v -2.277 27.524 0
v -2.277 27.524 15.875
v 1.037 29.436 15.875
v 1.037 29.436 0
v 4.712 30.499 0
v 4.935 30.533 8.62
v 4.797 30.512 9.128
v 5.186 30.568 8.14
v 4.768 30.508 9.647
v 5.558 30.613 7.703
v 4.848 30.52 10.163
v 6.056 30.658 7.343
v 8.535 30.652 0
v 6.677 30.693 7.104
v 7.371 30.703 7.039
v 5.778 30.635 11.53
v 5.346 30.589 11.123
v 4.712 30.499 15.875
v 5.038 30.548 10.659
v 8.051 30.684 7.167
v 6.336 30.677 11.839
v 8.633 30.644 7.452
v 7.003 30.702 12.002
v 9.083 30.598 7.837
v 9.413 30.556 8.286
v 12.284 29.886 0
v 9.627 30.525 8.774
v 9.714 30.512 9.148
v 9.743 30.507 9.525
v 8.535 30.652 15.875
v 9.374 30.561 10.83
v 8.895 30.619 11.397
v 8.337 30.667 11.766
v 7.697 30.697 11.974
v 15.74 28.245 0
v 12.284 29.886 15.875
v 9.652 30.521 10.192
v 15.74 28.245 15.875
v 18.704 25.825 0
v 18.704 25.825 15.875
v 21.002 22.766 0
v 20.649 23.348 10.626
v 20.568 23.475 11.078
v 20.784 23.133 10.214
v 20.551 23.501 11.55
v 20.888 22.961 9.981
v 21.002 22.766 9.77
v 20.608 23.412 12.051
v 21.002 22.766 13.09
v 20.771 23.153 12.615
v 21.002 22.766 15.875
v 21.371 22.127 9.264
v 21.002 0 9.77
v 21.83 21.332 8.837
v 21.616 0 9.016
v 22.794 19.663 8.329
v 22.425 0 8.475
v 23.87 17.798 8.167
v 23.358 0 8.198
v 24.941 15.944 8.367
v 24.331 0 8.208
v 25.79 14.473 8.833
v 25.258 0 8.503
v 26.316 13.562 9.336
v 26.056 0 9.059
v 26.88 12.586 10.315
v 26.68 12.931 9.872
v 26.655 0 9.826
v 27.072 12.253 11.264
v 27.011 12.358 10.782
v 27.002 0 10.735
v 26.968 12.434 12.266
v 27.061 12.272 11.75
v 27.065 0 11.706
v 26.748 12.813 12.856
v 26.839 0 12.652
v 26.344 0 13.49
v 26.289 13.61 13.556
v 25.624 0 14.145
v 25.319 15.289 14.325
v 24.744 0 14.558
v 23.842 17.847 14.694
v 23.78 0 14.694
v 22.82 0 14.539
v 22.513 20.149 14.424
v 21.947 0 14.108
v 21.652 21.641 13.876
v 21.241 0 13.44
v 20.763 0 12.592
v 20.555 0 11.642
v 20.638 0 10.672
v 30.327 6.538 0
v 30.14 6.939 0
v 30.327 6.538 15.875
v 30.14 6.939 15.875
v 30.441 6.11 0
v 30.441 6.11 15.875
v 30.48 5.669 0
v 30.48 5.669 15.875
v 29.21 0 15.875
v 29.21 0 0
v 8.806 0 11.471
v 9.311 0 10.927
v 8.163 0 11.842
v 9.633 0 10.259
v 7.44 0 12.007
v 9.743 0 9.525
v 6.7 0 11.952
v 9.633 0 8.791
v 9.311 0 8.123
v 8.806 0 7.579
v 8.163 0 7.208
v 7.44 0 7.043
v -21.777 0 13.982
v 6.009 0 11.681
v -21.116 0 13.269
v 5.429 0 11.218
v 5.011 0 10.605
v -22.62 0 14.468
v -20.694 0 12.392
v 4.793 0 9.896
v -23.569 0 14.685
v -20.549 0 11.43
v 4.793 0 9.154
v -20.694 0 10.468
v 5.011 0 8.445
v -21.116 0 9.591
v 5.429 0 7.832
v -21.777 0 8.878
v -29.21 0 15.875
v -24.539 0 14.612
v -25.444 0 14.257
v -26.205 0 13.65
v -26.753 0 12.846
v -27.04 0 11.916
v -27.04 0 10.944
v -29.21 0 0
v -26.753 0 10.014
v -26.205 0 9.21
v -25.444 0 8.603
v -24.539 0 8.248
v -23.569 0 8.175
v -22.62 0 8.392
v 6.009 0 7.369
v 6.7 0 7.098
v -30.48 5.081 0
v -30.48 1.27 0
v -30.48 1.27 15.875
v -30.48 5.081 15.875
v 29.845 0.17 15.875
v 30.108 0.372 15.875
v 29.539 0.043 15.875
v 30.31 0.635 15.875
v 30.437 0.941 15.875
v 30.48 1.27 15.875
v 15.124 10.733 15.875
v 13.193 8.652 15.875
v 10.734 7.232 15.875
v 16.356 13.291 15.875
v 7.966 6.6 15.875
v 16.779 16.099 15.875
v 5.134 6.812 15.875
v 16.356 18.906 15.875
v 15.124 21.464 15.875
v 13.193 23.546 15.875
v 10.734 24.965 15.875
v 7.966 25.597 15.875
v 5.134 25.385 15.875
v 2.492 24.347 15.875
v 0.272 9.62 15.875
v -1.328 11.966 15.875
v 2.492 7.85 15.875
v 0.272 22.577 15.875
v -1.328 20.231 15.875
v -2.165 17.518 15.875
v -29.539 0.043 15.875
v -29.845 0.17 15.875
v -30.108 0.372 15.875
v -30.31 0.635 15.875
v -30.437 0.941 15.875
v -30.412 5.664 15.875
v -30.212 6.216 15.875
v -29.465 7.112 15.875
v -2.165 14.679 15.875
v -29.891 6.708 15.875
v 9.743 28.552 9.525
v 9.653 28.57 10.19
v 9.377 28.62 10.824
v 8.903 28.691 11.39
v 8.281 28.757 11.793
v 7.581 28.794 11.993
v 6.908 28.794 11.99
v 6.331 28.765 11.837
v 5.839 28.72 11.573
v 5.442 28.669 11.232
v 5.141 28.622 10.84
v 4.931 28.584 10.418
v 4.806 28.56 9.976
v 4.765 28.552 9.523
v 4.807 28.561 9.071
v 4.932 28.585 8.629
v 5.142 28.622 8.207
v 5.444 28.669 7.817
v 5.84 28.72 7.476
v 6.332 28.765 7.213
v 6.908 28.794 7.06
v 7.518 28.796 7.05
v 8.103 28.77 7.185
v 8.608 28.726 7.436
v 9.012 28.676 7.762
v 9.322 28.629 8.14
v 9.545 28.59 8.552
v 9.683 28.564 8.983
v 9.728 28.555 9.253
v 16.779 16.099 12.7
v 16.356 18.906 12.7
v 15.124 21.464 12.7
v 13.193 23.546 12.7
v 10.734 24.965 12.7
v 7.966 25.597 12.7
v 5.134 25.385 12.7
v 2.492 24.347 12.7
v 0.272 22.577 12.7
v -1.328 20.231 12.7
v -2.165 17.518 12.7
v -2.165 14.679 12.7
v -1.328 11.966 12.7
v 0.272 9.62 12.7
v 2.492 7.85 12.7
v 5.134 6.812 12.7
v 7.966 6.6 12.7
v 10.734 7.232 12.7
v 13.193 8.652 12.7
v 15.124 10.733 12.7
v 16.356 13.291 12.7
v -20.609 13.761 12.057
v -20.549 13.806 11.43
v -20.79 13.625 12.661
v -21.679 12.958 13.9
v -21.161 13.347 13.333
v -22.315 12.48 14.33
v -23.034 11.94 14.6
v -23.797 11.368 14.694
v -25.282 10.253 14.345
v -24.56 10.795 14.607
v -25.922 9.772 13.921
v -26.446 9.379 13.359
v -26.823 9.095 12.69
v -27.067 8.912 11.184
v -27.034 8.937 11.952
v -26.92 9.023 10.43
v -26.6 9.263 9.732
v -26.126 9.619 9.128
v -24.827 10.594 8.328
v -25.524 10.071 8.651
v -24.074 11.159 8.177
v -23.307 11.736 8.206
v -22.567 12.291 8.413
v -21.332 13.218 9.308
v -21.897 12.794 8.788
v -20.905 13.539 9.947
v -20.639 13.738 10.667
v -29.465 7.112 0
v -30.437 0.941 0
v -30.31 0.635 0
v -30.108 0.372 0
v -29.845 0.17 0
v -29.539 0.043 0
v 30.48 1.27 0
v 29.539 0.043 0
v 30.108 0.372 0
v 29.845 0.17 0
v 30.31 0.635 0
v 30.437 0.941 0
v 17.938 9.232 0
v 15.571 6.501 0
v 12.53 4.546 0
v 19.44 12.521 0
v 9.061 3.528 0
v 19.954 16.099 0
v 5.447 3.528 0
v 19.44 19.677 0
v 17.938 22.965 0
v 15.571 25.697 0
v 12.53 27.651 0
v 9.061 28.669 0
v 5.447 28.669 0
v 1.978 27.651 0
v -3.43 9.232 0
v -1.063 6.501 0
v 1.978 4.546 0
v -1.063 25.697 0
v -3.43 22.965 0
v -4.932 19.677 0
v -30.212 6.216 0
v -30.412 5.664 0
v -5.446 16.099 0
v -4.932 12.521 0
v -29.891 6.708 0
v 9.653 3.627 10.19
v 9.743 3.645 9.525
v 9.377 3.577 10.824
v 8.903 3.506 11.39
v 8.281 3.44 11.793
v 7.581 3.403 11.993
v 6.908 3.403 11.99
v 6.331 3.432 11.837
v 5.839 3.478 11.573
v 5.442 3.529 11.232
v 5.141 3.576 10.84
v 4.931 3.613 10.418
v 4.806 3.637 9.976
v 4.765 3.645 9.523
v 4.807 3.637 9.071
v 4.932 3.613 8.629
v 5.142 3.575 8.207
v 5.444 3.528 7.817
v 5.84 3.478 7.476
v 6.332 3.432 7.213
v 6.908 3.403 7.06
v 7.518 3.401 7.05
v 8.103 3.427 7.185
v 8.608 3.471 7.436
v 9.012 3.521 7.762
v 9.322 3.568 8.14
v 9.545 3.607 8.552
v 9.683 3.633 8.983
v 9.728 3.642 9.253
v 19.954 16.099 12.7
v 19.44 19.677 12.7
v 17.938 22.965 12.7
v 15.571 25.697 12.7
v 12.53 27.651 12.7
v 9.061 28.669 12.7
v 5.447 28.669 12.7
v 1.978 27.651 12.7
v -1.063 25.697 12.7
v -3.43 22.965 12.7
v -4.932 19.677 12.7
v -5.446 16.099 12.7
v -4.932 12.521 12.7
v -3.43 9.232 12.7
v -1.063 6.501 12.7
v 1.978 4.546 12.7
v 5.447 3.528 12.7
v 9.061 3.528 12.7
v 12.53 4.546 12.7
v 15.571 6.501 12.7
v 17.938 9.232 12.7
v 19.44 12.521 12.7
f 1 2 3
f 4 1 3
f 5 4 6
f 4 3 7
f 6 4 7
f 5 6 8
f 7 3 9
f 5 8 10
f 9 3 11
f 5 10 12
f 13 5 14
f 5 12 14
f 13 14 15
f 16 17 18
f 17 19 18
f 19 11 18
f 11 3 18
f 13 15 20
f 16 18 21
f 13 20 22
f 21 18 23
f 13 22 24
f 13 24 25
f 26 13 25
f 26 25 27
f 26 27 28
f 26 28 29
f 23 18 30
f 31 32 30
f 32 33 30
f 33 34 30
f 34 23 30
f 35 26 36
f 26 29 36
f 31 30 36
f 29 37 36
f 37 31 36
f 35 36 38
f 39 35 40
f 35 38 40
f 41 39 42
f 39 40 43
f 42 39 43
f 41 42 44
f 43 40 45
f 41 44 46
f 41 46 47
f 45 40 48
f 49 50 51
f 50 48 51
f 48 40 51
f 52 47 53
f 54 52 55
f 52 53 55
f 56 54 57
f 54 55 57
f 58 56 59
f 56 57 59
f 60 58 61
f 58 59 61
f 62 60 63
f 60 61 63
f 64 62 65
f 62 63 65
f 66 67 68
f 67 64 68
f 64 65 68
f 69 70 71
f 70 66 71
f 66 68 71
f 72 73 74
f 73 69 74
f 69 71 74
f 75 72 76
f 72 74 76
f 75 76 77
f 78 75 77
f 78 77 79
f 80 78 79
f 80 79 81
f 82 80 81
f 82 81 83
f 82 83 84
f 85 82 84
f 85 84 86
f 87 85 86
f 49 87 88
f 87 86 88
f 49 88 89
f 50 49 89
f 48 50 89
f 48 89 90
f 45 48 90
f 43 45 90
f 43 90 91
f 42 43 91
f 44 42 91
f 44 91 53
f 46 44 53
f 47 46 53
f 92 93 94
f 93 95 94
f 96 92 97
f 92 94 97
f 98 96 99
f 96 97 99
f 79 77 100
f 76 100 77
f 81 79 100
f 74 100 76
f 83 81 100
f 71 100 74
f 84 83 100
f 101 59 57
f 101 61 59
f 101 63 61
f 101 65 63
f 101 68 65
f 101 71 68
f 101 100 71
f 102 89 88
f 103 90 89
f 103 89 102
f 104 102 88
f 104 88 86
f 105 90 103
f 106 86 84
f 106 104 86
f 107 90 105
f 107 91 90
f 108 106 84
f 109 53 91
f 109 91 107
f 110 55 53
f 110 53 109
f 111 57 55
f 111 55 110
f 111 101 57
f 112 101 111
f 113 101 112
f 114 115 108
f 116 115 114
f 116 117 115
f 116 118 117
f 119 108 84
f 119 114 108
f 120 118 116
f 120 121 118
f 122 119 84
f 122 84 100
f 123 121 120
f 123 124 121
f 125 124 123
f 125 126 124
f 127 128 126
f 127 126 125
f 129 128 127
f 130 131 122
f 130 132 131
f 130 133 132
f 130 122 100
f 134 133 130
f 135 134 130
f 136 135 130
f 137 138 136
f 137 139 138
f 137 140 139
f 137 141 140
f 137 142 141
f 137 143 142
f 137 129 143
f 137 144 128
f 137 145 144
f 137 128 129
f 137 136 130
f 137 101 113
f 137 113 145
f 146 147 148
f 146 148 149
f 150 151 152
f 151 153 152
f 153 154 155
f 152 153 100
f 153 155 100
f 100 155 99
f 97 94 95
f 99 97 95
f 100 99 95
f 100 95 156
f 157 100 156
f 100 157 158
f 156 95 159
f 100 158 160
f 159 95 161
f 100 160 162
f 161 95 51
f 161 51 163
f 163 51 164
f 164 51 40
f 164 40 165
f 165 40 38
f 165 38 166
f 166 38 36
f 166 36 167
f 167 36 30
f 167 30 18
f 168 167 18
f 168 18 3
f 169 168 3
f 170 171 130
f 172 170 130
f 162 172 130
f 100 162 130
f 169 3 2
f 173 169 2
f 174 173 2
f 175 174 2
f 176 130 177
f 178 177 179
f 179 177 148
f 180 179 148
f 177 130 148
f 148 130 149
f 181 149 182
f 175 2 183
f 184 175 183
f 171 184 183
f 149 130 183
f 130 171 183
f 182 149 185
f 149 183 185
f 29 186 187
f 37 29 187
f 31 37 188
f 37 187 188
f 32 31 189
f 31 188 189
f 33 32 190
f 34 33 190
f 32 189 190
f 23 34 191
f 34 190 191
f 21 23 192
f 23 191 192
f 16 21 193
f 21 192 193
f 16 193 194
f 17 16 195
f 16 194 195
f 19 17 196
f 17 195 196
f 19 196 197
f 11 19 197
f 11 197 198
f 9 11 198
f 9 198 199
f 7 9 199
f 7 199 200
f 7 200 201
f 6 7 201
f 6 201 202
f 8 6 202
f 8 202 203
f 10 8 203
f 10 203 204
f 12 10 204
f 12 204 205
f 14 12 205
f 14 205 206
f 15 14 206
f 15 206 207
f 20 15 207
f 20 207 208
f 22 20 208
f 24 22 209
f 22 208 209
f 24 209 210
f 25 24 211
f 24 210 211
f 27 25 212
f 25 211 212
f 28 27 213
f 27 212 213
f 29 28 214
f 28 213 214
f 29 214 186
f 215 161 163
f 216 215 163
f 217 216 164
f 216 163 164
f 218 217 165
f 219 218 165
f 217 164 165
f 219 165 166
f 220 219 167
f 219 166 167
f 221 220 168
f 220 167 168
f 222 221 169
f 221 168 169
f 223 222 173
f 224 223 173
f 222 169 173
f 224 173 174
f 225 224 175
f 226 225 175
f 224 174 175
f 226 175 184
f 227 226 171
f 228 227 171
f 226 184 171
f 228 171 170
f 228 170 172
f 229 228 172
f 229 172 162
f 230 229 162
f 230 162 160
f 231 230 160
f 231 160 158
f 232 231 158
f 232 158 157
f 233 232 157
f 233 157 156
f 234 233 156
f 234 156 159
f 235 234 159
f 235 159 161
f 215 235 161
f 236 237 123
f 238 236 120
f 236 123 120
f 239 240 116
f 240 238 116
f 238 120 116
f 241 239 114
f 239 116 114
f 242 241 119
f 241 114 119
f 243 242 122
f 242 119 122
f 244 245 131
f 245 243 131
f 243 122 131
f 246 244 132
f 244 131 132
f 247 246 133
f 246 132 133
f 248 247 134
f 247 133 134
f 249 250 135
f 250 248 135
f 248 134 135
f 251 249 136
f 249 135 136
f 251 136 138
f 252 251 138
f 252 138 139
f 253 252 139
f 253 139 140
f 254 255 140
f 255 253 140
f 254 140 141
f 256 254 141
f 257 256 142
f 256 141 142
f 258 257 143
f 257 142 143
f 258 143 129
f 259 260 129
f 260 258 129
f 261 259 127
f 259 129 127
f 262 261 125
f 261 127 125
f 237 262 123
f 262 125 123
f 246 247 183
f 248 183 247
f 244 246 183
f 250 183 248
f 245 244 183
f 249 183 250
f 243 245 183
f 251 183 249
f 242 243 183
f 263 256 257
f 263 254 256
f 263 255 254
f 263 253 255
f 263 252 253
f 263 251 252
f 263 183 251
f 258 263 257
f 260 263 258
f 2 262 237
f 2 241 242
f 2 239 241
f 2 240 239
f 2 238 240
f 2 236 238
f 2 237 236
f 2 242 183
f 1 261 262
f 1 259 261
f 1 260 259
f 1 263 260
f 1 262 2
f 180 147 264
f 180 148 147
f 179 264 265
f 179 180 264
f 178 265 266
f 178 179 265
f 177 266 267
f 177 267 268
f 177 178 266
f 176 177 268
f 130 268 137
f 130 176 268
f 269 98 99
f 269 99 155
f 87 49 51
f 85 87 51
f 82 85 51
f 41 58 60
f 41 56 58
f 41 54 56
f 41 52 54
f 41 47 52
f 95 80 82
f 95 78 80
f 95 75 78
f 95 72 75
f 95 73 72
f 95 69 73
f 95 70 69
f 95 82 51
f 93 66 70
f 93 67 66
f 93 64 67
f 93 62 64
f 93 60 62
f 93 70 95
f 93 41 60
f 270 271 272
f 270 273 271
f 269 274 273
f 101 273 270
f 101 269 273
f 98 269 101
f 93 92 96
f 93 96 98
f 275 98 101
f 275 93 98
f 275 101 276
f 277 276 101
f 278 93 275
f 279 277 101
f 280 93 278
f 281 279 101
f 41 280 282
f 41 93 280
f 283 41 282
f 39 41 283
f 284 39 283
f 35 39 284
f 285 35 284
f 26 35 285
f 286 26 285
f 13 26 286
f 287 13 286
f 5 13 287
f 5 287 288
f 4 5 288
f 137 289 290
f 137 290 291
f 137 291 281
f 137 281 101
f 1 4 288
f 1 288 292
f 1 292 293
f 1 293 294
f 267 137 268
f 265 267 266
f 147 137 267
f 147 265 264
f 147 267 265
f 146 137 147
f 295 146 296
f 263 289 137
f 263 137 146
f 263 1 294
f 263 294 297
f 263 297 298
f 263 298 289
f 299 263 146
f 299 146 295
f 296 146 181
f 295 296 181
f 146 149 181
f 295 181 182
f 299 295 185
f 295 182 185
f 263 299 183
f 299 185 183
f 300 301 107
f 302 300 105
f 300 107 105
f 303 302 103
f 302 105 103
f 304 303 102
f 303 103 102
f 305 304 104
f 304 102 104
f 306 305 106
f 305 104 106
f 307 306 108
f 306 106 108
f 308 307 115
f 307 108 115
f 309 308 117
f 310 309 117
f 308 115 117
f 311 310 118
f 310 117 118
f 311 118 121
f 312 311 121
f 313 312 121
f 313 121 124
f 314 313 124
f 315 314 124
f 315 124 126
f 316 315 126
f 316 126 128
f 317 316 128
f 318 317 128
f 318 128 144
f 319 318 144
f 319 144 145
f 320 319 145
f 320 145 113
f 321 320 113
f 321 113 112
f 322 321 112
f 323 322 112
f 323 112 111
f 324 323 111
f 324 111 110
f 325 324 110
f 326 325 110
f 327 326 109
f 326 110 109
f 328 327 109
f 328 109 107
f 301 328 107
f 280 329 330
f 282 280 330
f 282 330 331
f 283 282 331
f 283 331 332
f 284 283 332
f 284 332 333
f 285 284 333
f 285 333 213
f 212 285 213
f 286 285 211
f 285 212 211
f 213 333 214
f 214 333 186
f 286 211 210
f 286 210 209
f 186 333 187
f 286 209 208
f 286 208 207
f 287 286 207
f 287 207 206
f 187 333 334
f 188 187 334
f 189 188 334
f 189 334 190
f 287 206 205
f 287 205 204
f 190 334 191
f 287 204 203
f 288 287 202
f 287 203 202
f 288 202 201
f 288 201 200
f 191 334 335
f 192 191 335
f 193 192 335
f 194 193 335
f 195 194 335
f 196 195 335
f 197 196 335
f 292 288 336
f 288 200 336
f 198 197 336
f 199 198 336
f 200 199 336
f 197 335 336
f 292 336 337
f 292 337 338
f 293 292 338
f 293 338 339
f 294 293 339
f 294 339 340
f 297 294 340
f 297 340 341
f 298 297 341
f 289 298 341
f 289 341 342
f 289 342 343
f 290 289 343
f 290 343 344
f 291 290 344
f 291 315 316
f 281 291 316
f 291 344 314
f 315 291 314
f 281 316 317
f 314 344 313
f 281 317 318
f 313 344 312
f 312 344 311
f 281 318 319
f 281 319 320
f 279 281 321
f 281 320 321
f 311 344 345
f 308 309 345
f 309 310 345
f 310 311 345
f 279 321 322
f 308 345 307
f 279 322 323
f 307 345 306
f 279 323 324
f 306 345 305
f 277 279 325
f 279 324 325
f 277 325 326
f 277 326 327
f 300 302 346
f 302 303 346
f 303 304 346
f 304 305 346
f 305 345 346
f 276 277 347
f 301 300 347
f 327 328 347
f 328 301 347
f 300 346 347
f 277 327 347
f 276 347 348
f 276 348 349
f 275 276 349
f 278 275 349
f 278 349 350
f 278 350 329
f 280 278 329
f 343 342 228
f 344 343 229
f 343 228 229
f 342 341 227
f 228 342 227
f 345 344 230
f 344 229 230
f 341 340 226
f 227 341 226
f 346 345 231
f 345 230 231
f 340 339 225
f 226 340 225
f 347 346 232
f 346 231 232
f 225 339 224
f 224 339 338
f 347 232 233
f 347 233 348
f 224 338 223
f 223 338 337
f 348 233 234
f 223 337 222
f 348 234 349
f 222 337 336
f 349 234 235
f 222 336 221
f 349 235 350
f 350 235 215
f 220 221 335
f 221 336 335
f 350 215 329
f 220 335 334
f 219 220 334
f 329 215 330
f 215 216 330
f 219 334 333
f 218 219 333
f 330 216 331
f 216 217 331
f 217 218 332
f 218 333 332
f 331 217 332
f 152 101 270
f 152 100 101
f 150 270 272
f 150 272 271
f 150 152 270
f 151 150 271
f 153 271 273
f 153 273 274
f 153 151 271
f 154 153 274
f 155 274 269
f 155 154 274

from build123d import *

# Parameters (mm, degrees)
SALIENTE_EXTRUIR1_DEPTH = 15.875
REDONDEO1_R             = 15.875
CORTAR_EXTRUIR1_REACH   = 48.084
CROQUIS2_R              = 9.525
CORTAR_EXTRUIR2_START   = -3.175
CROQUIS3_R              = 12.7
CORTAR_EXTRUIR2_DEPTH   = 43.909243503
CROQUIS4_R              = 3.2639
CROQUIS4_R_2            = 2.4892
CORTAR_EXTRUIR3_DEPTH   = 47.084243503
REDONDEO2_R             = 1.27
REDONDEO3_R             = 2.54


with BuildPart() as part:
    # Croquis1 → Saliente-Extruir1 (new body)
    with BuildSketch(Plane.XY):
        Polygon((30.48, 0), (-30.48, 0), (-30.48, 6.35), (12.046472996, 38.277805334), (30.48, 6.35), align=None)
    extrude(amount=SALIENTE_EXTRUIR1_DEPTH)

    # Redondeo1
    redondeo1_edges = [part.edges().sort_by_distance(p)[0] for p in [
        (12.046472996, 38.277805334, 7.9375),
    ]]
    fillet(redondeo1_edges, radius=REDONDEO1_R)

    # Croquis2 → Cortar-Extruir1 (cut, up to next)
    with BuildSketch(Plane.XY.offset(15.875), mode=Mode.PRIVATE) as cortar_extruir1_sk1:
        with Locations((7.254003, 16.09860686)):
            Circle(CROQUIS2_R)
    cortar_extruir1_tool1 = extrude(cortar_extruir1_sk1.sketch, amount=-CORTAR_EXTRUIR1_REACH, mode=Mode.PRIVATE) & part.part
    add(cortar_extruir1_tool1.solids().sort_by_distance((7.254003, 16.098607, 15.875))[0], mode=Mode.SUBTRACT)

    # Croquis3 → Cortar-Extruir2 (cut, through all)
    with BuildSketch(Plane.XY.offset(15.875).offset(CORTAR_EXTRUIR2_START)):
        with Locations((7.254003, 16.09860686)):
            Circle(CROQUIS3_R)
    extrude(amount=-CORTAR_EXTRUIR2_DEPTH, mode=Mode.SUBTRACT)

    # Croquis4 → Cortar-Extruir3 (cut, through all)
    with BuildSketch(Plane.XZ):
        with Locations((-23.8125, 11.43)):
            Circle(CROQUIS4_R)
        with Locations(Location((23.8125, 11.43, 0), (0, 0, 210.56660833))):
            Circle(CROQUIS4_R)
        with Locations((7.254003, 9.525)):
            Circle(CROQUIS4_R_2)
    extrude(amount=-CORTAR_EXTRUIR3_DEPTH, mode=Mode.SUBTRACT)

    # Redondeo2
    redondeo2_edges = [part.edges().sort_by_distance(p)[0] for p in [
        (30.48, 0, 7.9375),
        (-30.48, 0, 7.9375),
    ]]
    fillet(redondeo2_edges, radius=REDONDEO2_R)

    # Redondeo3
    redondeo3_edges = [part.edges().sort_by_distance(p)[0] for p in [
        (-30.48, 6.35, 7.9375),
        (30.48, 6.35, 7.9375),
    ]]
    fillet(redondeo3_edges, radius=REDONDEO3_R)


solid = part.part
